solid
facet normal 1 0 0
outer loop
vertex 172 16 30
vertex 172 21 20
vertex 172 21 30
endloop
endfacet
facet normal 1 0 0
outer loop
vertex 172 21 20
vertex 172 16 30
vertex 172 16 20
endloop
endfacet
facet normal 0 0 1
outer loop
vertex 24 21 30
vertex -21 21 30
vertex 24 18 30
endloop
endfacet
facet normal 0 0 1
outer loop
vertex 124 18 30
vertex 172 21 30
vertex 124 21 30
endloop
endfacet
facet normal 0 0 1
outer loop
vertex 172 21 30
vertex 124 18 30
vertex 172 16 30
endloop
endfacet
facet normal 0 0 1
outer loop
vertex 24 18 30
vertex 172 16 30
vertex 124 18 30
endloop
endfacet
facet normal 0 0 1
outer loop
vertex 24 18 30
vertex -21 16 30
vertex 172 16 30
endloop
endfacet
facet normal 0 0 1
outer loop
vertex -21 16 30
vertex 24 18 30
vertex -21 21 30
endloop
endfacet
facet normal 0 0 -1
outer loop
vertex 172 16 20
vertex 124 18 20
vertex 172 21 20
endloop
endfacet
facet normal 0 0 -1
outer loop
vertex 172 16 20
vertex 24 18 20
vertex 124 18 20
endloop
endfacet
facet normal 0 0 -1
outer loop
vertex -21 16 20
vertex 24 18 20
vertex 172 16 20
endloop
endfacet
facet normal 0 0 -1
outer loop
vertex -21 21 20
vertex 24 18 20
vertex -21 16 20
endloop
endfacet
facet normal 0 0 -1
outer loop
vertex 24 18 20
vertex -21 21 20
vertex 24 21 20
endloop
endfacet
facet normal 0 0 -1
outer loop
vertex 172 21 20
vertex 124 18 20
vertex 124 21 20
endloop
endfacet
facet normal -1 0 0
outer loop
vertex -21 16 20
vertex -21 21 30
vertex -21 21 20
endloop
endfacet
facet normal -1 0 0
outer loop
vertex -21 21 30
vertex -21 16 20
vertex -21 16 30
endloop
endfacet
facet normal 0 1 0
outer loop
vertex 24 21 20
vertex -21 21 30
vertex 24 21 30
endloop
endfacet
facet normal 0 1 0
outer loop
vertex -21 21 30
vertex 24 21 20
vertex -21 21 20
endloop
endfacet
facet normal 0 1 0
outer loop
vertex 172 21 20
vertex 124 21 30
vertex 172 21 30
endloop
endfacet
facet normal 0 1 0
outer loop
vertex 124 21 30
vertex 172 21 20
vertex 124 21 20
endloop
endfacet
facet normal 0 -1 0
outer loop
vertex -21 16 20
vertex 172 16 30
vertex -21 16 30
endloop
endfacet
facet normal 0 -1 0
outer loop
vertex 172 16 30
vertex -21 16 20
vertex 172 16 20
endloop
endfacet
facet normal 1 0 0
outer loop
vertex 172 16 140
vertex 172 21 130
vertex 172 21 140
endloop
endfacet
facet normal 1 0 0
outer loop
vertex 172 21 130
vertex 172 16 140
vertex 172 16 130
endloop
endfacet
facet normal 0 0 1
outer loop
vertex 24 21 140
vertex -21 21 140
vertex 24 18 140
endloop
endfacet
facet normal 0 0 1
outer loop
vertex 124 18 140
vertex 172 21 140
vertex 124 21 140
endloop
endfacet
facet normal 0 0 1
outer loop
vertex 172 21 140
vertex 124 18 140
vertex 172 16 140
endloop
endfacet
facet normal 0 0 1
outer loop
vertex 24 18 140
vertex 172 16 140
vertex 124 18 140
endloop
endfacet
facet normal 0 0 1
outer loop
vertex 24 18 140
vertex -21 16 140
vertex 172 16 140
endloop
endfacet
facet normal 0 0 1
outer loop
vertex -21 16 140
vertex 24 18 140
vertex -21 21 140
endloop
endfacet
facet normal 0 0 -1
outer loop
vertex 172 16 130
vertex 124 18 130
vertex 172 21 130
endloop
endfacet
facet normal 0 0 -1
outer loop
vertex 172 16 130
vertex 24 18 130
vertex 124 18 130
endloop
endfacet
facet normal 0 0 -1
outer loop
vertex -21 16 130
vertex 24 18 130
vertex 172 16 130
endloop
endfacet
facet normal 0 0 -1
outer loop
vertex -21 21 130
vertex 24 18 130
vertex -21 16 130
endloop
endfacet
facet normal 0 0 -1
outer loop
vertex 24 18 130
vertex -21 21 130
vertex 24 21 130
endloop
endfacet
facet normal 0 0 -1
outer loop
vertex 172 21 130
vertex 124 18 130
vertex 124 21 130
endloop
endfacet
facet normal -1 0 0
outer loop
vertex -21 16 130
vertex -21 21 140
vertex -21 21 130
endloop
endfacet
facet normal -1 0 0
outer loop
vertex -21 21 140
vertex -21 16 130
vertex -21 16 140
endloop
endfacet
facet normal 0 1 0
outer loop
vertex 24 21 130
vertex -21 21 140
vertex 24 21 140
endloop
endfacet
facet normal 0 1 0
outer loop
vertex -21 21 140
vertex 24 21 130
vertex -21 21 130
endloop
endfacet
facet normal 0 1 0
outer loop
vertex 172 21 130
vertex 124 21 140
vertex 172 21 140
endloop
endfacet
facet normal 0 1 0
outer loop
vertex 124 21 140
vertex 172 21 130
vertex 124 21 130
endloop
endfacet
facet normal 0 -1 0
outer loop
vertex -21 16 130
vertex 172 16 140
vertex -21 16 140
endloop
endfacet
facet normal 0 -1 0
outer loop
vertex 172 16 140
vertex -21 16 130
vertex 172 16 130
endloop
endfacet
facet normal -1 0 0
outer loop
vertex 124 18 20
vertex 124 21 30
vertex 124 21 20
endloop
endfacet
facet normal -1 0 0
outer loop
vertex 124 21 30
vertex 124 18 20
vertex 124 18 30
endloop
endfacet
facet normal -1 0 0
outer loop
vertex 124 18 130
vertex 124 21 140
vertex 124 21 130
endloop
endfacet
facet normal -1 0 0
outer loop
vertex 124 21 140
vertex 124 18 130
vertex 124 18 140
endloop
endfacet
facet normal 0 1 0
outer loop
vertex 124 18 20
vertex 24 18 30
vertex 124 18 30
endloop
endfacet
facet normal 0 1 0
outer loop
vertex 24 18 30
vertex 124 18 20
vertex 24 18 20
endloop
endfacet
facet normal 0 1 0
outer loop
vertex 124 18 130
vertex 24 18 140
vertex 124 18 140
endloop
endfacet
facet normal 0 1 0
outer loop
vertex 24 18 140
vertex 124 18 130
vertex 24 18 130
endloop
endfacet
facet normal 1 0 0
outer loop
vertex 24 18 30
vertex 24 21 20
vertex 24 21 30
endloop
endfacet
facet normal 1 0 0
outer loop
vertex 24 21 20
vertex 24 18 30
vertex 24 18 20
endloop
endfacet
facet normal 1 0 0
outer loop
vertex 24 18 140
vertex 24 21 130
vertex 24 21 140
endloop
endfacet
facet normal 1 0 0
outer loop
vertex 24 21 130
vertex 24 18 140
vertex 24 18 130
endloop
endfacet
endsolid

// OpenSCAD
//$fn=128;

difference(){

union(){
translate([-21,16,20])
cube([193,5,10]);
translate([-21,16,130])
cube([193,5,10]);
}


translate([24,18,150])
rotate([-90,0,0])
union(){
	//Коробка
	difference() {
		cube([100,140 ,50 ]);
		translate([3,3 ,6]) 
			cube([94,134 ,46 ]);
		}
	

	//Выступ
	difference() {
		
			translate([2,2 ,9 ]) 
				cube([96,136 ,46 ]);
			
			translate([3, 3, 13]) 
				cube([94, 134, 44]);
			}
		}
		
}
